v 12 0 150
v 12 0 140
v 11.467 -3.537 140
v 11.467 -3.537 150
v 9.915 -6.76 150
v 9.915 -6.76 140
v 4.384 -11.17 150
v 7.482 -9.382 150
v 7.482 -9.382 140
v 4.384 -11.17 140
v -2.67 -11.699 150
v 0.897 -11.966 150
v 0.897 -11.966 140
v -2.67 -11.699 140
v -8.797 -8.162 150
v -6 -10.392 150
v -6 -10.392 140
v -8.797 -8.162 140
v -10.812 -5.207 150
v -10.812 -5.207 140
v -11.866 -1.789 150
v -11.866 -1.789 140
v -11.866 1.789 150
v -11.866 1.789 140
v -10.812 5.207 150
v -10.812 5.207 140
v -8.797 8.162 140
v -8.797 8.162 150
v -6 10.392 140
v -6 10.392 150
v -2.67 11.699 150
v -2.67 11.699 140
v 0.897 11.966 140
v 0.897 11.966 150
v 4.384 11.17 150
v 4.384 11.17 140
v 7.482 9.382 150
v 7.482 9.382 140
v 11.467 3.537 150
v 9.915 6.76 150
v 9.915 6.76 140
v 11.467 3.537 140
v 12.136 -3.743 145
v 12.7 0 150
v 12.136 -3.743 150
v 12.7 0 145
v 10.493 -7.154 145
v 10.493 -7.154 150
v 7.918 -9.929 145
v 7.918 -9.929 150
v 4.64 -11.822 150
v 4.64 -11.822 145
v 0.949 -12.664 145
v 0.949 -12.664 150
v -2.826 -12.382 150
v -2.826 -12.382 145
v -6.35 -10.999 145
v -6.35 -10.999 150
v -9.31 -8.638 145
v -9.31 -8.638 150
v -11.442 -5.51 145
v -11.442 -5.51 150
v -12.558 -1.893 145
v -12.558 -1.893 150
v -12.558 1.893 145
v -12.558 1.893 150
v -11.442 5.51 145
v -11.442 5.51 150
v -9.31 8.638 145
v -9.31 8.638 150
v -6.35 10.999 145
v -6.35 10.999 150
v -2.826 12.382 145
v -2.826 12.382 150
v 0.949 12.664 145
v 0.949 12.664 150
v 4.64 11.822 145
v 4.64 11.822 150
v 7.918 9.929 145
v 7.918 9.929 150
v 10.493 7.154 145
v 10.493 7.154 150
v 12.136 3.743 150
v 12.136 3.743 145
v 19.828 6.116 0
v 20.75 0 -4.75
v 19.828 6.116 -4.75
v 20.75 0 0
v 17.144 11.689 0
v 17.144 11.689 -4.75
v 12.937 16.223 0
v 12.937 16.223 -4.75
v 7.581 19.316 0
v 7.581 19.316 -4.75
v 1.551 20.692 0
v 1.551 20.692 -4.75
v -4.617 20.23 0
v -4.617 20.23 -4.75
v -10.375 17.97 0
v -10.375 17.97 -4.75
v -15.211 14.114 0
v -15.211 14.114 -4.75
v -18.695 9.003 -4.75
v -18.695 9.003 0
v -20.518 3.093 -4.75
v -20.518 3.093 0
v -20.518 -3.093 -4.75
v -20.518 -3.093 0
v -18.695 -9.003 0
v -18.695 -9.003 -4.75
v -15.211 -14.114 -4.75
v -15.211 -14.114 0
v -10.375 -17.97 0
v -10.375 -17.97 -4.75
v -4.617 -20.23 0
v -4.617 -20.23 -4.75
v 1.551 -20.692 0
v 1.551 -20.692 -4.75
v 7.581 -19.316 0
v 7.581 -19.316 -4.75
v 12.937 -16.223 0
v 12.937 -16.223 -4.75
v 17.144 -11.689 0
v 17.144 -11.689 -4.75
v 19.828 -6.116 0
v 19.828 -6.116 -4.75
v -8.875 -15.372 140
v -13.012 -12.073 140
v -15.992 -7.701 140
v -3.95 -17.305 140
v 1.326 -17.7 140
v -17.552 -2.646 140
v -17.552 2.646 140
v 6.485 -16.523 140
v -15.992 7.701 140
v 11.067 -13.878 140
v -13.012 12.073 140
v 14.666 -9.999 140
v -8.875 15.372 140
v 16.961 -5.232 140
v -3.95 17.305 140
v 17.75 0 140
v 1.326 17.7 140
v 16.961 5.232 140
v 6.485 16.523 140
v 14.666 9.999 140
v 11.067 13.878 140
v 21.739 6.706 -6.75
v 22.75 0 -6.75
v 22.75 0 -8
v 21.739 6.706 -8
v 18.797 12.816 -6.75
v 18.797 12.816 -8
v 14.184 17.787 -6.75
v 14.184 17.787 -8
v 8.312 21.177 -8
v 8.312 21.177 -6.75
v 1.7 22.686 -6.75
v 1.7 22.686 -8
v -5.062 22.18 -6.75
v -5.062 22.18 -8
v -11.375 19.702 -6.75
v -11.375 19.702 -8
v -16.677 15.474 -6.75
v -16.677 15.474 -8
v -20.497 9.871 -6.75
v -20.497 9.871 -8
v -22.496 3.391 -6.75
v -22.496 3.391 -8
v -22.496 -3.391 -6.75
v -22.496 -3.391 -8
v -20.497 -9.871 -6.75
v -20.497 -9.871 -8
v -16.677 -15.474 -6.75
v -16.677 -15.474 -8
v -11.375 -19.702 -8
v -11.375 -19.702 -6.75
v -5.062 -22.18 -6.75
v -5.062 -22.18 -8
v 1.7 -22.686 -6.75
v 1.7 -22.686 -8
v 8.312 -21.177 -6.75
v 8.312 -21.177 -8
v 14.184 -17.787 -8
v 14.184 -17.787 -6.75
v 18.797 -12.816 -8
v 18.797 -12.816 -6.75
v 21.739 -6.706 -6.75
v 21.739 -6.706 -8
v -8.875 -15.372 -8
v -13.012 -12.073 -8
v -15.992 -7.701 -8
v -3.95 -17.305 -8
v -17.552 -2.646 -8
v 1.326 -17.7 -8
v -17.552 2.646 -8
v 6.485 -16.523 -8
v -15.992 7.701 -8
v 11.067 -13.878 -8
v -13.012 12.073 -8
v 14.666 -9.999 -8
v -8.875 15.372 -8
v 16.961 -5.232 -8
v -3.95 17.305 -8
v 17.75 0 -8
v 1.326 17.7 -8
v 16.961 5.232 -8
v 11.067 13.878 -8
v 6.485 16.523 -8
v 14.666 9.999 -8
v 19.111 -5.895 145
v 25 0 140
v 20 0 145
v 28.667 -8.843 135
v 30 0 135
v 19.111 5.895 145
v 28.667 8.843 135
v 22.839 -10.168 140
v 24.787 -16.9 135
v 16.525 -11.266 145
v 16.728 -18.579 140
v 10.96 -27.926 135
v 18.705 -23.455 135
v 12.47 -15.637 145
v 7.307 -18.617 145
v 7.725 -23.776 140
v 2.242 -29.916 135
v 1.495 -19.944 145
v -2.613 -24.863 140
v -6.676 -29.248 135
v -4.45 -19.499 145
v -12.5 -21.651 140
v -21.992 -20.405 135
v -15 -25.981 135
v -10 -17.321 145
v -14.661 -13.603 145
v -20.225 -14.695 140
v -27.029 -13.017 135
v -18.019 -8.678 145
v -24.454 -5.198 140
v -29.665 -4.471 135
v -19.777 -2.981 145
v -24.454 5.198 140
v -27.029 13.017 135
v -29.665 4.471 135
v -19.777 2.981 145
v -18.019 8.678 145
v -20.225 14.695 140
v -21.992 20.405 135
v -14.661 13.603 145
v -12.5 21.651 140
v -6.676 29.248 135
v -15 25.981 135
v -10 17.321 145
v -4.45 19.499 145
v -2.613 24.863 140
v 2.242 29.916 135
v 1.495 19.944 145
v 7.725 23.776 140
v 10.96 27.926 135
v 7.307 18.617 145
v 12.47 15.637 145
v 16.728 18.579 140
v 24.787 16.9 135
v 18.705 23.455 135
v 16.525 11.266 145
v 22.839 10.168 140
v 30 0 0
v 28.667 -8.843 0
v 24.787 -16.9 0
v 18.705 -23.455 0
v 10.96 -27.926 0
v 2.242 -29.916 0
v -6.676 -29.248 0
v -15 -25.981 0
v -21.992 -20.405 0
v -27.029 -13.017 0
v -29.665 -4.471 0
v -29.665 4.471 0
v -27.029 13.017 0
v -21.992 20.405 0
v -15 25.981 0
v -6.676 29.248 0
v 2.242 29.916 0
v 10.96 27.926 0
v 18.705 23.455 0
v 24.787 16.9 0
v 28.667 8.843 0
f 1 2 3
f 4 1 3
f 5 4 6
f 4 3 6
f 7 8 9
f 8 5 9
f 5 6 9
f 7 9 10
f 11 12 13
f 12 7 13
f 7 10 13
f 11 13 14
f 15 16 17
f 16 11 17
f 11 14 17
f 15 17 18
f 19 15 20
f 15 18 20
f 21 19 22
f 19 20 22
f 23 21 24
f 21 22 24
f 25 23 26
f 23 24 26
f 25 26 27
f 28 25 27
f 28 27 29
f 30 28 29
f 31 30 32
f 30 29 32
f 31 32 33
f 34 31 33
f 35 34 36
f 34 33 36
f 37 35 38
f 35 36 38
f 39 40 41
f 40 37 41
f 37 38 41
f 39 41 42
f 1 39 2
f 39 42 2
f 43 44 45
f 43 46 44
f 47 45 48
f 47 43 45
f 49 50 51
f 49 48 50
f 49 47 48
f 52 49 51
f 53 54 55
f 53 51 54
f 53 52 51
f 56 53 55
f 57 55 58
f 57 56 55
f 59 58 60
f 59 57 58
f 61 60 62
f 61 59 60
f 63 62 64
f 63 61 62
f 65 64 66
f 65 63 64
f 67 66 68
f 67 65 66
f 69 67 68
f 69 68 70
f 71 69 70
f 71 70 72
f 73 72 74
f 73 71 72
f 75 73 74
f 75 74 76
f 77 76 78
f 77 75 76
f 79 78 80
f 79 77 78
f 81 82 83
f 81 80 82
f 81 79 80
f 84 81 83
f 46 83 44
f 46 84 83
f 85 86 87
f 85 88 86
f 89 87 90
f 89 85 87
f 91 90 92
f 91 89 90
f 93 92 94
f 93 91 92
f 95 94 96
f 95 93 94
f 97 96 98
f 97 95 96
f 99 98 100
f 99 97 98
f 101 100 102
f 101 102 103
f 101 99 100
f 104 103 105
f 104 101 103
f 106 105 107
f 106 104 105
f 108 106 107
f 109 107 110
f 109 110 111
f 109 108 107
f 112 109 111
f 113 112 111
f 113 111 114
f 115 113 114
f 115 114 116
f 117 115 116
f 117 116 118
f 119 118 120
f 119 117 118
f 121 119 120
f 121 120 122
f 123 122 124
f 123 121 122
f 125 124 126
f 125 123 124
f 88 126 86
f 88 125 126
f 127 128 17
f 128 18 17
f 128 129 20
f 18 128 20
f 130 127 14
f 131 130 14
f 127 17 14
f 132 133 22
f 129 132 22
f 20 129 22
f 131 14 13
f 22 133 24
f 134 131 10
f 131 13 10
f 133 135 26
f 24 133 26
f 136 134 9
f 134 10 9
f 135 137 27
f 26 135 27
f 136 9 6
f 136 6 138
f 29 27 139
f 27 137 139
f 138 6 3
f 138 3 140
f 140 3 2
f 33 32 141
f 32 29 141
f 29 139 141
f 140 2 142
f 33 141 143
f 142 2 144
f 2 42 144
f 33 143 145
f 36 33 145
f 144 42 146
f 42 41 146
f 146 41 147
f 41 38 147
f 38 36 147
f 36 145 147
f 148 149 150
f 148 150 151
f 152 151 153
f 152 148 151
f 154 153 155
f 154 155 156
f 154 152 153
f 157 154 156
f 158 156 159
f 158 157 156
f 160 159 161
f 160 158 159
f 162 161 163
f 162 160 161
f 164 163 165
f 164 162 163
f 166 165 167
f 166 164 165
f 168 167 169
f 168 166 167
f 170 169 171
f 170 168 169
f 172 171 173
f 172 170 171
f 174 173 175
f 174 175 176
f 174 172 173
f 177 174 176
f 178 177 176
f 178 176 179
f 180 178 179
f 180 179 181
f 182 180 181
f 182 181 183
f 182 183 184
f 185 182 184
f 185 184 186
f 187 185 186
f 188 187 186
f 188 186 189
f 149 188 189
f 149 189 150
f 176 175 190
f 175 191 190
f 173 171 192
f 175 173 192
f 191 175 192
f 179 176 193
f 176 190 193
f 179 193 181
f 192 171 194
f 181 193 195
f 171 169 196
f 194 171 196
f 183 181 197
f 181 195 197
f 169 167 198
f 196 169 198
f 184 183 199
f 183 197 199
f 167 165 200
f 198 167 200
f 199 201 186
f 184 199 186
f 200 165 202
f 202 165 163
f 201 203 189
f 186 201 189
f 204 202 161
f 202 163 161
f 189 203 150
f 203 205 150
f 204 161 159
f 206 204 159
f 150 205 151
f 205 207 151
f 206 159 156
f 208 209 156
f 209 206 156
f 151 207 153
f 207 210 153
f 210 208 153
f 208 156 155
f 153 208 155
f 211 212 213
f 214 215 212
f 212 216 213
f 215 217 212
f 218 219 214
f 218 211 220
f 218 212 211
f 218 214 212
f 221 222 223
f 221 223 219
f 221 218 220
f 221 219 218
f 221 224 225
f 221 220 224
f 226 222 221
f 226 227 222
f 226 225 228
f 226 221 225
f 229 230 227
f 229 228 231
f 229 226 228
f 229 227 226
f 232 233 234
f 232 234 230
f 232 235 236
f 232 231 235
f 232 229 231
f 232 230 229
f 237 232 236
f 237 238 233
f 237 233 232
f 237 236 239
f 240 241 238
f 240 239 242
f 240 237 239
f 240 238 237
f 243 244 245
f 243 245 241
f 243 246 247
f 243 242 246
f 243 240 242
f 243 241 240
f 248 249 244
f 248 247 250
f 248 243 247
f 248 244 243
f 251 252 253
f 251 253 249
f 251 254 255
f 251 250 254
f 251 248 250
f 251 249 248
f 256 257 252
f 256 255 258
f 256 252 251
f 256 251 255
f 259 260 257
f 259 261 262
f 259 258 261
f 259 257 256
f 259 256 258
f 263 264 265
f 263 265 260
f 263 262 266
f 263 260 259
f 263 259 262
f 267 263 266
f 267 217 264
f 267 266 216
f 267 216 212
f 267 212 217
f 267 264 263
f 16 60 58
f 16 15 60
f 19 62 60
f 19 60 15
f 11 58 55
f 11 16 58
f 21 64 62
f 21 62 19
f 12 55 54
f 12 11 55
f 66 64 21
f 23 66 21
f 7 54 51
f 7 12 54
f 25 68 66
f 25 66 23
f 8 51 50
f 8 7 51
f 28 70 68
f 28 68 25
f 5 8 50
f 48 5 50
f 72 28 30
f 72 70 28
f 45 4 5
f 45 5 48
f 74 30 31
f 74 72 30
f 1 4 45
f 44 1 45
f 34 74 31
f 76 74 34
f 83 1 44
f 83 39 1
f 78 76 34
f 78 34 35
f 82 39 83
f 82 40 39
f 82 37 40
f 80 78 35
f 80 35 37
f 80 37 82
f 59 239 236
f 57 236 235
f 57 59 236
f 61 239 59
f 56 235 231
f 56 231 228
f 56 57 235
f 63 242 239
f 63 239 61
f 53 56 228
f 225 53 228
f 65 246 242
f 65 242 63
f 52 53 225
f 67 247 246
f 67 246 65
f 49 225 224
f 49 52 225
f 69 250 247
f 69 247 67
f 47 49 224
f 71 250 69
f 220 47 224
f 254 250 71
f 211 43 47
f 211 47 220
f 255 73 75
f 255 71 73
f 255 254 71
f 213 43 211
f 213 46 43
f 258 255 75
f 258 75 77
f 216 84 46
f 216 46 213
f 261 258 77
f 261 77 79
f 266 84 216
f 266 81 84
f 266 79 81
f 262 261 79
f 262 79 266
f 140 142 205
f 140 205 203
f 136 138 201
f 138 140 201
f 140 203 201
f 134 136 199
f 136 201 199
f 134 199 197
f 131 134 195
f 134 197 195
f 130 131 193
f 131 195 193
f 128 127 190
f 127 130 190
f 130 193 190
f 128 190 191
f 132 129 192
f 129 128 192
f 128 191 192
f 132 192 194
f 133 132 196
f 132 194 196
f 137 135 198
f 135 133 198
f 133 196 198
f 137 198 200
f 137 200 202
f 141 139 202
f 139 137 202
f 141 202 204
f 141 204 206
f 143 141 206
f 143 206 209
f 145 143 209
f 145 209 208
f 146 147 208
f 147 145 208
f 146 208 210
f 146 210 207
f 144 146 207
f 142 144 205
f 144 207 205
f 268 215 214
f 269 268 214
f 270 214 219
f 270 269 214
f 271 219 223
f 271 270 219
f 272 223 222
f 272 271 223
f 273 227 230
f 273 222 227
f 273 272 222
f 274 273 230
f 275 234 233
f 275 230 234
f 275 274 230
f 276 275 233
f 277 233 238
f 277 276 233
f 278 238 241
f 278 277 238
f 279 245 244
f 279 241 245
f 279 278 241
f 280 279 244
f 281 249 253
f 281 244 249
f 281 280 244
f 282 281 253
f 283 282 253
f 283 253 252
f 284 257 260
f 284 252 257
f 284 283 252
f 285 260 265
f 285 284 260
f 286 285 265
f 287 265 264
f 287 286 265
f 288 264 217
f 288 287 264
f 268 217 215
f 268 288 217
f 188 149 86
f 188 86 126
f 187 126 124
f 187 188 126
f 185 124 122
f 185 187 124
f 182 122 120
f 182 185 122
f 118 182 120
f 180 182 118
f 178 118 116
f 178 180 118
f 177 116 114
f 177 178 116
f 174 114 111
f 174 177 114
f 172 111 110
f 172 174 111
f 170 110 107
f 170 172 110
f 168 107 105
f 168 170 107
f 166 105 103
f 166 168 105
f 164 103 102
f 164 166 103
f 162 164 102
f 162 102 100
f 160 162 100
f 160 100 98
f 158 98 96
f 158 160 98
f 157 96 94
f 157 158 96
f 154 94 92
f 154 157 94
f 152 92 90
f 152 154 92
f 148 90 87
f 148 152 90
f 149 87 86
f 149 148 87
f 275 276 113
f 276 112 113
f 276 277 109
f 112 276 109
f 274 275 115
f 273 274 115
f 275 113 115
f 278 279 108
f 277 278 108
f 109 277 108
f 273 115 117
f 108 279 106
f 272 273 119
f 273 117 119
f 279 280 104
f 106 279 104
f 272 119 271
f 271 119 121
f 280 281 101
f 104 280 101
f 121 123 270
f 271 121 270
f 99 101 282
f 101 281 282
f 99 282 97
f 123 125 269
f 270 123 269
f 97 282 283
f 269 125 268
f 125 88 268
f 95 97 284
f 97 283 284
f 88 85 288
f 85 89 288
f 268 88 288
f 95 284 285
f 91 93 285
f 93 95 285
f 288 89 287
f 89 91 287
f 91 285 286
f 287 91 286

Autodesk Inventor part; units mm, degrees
ref_plane "YZ Plane" through (0, 0, 0) normal (1, 0, 0) x (0, 1, 0)
ref_plane "XZ Plane" through (0, 0, 0) normal (0, 1, 0) x (-1, 0, 0)
ref_plane "XY Plane" through (0, 0, 0) normal (0, 0, 1) x (1, 0, 0)
sketch "Sketch1" plane through (0, 0, 0) normal (0, 0, 1) x (1, 0, 0)
  circle A0 centre (0, 0) radius 17.75
  circle A1 centre (0, 0) radius 30
  dimension "d0" = 35.5
  dimension "d1" = 60
extrude "Extrusion1" add sketch "Sketch1" along normal blind 140
sketch "Sketch2" plane through (0, 0, 0) normal (0, 0, -1) x (-1, 0, 0)
  point P0 (0, 0)
sketch "Sketch3" plane through (0, 0, 0) normal (0, 1, 0) x (-1, 0, 0)
  line L0 (0, -10.8) -> (0, 8.8) construction
  line L1 (-30.85, 0) -> (25.85, 0) construction
  line L2 (-17.75, 140) -> (17.75, 140) construction
  line L3 (17.75, 0) -> (-17.75, 0) construction
  line L4 (-17.75, 0) -> (-17.75, -8)
  line L5 (-17.75, -8) -> (-22.75, -8)
  line L6 (-22.75, -8) -> (-22.75, -6.75)
  line L7 (-17.75, 0) -> (-20.75, 0)
  line L8 (-22.75, -6.75) -> (-20.75, -4.75)
  line L9 (-22.75, -6.75) -> (-19.9216, -6.75) construction
  line L10 (-20.75, -4.75) -> (-20.75, 0)
  point P0 (0, 0)
  dimension "d4" = 8
  dimension "d5" = 5
  dimension "d6" = 1.25
  dimension "d7" = 3
  dimension "d8" = 45
revolve "Revolution1" add sketch "Sketch3" angle 360 about axis through (0, 0, 0) along (0, 0, 1)
sketch "Sketch5" plane through (0, 0, 140) normal (0, 0, 1) x (1, 0, 0)
  circle A0 centre (0, 0) radius 12
  circle A1 centre (0, 0) radius 30 projected
  dimension "d22" = 24
extrude "Extrusion2" add sketch "Sketch5" along normal blind 5
sketch "Sketch6" plane through (0, 0, 145) normal (0, 0, 1) x (1, 0, 0)
  circle A0 centre (0, 0) radius 12 projected
  circle A1 centre (0, 0) radius 12.7
  dimension "d25" = 25.4
extrude "Extrusion3" add sketch "Sketch6" along normal blind 5
chamfer "Chamfer1" distance 10 angle 45 1 edges at (-30, 0, 145)
properties part number "MVX-TL and MVX-TV1X-coarse-reference"
